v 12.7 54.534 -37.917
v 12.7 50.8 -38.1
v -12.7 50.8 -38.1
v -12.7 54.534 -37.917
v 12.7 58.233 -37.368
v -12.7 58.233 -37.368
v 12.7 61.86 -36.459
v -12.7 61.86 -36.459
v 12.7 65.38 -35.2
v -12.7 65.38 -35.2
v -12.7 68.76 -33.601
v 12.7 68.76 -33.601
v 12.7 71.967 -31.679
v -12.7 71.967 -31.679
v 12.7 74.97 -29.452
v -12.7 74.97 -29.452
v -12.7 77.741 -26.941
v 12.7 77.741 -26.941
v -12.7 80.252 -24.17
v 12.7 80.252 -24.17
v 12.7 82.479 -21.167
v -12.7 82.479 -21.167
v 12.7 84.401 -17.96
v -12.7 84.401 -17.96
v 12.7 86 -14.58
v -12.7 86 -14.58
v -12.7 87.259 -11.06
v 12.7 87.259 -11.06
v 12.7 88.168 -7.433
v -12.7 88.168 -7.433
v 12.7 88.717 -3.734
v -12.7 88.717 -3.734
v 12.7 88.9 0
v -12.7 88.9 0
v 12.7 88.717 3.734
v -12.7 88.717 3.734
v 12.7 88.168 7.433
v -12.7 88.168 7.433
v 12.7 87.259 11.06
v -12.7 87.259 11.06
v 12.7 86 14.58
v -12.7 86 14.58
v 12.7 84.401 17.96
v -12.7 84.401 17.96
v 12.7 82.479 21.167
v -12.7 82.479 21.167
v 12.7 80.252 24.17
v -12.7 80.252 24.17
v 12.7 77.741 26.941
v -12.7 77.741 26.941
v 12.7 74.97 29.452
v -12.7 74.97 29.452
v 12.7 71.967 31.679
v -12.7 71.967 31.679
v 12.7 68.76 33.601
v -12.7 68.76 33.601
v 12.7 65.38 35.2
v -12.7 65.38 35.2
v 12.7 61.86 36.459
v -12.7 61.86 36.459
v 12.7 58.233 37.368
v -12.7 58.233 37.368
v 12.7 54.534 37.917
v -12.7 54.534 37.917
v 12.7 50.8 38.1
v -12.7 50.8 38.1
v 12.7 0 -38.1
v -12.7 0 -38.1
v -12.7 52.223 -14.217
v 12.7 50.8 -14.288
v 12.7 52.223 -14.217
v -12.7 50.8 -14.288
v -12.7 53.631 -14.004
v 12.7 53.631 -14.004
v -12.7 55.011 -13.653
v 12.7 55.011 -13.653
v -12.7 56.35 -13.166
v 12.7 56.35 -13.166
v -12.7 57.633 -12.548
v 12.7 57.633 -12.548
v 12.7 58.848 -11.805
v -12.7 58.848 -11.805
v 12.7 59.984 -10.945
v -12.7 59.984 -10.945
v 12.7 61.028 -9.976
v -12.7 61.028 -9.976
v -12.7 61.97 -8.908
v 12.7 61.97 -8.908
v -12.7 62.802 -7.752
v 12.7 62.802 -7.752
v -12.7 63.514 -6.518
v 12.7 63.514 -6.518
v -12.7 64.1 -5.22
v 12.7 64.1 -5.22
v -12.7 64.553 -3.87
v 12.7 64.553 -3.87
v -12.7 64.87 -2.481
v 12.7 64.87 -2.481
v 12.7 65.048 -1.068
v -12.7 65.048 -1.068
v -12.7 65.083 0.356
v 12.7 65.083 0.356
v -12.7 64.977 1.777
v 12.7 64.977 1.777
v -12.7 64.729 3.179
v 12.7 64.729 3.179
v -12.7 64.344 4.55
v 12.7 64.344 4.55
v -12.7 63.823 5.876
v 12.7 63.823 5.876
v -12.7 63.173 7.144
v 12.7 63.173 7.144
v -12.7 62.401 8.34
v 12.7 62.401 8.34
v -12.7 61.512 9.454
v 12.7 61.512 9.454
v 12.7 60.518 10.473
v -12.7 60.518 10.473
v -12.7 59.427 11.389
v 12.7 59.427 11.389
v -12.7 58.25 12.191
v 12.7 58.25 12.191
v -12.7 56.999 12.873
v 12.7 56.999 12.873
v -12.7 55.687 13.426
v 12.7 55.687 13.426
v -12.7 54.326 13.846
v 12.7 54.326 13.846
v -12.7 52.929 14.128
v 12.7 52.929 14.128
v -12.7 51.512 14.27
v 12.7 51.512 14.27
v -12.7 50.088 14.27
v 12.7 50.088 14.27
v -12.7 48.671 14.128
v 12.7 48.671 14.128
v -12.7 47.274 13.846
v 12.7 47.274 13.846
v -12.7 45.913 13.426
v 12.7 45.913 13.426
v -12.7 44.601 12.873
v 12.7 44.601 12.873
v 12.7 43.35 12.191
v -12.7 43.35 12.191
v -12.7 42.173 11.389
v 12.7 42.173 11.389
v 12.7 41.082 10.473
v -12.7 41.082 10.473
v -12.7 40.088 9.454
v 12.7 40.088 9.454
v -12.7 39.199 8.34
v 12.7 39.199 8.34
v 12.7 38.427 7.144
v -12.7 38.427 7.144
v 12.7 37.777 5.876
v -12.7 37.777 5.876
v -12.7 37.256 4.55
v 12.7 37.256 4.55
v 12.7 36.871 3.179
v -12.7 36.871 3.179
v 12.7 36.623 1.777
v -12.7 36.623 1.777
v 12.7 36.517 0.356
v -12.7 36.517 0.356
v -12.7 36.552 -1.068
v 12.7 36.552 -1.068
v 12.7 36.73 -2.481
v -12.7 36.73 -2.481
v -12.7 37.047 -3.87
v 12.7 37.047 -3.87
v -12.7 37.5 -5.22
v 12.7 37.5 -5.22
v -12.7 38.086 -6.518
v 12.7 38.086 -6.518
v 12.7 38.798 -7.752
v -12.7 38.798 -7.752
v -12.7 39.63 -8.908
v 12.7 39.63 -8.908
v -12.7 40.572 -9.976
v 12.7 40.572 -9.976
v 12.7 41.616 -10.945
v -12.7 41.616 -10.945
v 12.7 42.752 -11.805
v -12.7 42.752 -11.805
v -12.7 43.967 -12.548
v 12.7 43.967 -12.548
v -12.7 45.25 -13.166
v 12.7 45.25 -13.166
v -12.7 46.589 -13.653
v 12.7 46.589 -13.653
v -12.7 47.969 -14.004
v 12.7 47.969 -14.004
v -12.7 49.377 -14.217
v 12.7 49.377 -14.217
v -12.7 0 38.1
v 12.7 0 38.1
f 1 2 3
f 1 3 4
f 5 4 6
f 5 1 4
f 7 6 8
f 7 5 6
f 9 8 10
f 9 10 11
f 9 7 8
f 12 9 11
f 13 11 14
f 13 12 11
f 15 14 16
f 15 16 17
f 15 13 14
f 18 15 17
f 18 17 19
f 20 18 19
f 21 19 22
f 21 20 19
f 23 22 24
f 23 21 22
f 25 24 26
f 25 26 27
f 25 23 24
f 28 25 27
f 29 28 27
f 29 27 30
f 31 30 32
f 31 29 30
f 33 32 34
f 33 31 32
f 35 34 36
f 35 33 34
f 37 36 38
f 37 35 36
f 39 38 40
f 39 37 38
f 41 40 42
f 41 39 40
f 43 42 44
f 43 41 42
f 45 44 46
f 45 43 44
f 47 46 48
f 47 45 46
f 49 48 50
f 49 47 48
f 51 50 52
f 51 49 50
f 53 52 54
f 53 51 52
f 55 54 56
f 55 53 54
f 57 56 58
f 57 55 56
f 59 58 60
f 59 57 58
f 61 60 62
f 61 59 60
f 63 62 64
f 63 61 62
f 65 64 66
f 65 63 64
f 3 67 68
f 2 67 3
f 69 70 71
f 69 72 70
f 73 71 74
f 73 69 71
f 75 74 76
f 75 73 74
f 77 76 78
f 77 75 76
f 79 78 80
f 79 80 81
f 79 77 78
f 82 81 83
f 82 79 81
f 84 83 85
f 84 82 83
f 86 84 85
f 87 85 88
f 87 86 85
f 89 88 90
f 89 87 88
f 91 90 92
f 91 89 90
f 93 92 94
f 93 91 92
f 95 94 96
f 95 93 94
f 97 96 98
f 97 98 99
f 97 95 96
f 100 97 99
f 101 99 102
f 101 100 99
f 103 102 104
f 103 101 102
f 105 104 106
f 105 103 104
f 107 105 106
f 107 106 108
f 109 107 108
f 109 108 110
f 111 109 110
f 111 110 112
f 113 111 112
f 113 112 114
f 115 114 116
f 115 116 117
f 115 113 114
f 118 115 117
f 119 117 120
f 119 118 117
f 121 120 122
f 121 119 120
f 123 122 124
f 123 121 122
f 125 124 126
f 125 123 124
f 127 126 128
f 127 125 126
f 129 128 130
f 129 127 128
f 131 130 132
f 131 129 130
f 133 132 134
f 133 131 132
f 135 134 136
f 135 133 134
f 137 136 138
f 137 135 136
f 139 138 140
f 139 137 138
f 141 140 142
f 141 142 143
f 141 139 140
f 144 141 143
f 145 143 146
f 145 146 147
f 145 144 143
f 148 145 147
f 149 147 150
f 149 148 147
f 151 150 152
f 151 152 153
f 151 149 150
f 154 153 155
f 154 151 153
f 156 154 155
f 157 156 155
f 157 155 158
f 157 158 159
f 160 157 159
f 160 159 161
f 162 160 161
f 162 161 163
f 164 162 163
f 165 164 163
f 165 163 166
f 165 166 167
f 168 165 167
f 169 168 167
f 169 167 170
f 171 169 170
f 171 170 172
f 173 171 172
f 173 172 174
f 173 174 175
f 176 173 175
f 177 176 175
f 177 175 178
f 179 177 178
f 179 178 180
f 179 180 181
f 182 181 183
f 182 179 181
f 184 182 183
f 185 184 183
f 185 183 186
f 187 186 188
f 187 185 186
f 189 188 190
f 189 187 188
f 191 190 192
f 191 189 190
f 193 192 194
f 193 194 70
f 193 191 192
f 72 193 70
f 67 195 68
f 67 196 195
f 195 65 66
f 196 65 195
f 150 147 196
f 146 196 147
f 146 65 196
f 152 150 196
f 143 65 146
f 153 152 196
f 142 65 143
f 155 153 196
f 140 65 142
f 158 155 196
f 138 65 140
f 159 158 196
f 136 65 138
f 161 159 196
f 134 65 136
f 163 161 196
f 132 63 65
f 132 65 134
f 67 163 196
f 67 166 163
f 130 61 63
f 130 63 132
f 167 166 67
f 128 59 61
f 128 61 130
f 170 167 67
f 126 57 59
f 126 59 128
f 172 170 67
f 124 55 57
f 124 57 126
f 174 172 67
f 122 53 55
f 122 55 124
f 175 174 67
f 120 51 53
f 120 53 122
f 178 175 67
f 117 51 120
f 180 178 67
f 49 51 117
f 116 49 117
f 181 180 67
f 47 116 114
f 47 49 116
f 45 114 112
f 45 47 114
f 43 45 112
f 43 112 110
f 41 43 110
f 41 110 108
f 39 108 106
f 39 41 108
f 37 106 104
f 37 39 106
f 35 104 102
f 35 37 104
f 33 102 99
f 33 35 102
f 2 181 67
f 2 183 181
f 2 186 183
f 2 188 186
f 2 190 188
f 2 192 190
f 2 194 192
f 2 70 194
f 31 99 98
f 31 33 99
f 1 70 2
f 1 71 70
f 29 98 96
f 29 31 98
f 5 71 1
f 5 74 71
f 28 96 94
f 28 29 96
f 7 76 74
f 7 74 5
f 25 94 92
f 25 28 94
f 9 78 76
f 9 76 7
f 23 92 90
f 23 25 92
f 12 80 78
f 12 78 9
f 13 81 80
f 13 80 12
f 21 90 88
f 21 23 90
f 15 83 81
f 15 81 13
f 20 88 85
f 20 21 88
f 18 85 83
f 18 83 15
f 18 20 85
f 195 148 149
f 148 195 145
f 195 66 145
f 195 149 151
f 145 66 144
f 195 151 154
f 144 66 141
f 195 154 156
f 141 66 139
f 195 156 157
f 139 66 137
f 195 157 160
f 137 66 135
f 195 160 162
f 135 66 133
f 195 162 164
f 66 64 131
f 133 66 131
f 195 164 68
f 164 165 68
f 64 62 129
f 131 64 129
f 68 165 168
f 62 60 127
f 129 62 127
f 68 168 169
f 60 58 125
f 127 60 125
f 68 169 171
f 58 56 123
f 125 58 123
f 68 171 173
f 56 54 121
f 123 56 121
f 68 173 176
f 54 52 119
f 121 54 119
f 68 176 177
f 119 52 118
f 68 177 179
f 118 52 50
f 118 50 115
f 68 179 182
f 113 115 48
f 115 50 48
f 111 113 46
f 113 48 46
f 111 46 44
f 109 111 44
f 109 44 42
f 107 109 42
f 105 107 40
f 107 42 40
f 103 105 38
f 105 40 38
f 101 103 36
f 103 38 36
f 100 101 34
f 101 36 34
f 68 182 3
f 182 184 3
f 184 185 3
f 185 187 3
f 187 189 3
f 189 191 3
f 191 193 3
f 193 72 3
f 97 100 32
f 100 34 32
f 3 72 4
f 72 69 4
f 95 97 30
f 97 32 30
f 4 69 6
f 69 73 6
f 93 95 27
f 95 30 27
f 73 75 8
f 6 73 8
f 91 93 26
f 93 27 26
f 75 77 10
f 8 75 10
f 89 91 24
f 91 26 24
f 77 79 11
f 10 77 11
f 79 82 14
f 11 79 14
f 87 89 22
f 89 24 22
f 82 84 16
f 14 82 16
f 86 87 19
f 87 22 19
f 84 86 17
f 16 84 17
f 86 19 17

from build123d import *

# Parameters (mm, degrees)
SKETCH1_R           = 14.2875
BOSS_EXTRUDE1_DEPTH = 12.7


with BuildPart() as part:
    # Sketch1 → Boss-Extrude1 (new body, symmetric)
    with BuildSketch(Plane(origin=(0, 0, 0), x_dir=(0, 0, -1), z_dir=(1, 0, 0))):
        with BuildLine():
            Line((-38.1, 0), (38.1, 0))
            Line((38.1, 0), (38.1, 50.8))
            ThreePointArc((38.1, 50.8), (0, 88.9), (-38.1, 50.8))
            Line((-38.1, 50.8), (-38.1, 0))
        make_face()
        with Locations((0, 50.8)):
            Circle(SKETCH1_R, mode=Mode.SUBTRACT)
    extrude(amount=BOSS_EXTRUDE1_DEPTH, both=True)


solid = part.part
